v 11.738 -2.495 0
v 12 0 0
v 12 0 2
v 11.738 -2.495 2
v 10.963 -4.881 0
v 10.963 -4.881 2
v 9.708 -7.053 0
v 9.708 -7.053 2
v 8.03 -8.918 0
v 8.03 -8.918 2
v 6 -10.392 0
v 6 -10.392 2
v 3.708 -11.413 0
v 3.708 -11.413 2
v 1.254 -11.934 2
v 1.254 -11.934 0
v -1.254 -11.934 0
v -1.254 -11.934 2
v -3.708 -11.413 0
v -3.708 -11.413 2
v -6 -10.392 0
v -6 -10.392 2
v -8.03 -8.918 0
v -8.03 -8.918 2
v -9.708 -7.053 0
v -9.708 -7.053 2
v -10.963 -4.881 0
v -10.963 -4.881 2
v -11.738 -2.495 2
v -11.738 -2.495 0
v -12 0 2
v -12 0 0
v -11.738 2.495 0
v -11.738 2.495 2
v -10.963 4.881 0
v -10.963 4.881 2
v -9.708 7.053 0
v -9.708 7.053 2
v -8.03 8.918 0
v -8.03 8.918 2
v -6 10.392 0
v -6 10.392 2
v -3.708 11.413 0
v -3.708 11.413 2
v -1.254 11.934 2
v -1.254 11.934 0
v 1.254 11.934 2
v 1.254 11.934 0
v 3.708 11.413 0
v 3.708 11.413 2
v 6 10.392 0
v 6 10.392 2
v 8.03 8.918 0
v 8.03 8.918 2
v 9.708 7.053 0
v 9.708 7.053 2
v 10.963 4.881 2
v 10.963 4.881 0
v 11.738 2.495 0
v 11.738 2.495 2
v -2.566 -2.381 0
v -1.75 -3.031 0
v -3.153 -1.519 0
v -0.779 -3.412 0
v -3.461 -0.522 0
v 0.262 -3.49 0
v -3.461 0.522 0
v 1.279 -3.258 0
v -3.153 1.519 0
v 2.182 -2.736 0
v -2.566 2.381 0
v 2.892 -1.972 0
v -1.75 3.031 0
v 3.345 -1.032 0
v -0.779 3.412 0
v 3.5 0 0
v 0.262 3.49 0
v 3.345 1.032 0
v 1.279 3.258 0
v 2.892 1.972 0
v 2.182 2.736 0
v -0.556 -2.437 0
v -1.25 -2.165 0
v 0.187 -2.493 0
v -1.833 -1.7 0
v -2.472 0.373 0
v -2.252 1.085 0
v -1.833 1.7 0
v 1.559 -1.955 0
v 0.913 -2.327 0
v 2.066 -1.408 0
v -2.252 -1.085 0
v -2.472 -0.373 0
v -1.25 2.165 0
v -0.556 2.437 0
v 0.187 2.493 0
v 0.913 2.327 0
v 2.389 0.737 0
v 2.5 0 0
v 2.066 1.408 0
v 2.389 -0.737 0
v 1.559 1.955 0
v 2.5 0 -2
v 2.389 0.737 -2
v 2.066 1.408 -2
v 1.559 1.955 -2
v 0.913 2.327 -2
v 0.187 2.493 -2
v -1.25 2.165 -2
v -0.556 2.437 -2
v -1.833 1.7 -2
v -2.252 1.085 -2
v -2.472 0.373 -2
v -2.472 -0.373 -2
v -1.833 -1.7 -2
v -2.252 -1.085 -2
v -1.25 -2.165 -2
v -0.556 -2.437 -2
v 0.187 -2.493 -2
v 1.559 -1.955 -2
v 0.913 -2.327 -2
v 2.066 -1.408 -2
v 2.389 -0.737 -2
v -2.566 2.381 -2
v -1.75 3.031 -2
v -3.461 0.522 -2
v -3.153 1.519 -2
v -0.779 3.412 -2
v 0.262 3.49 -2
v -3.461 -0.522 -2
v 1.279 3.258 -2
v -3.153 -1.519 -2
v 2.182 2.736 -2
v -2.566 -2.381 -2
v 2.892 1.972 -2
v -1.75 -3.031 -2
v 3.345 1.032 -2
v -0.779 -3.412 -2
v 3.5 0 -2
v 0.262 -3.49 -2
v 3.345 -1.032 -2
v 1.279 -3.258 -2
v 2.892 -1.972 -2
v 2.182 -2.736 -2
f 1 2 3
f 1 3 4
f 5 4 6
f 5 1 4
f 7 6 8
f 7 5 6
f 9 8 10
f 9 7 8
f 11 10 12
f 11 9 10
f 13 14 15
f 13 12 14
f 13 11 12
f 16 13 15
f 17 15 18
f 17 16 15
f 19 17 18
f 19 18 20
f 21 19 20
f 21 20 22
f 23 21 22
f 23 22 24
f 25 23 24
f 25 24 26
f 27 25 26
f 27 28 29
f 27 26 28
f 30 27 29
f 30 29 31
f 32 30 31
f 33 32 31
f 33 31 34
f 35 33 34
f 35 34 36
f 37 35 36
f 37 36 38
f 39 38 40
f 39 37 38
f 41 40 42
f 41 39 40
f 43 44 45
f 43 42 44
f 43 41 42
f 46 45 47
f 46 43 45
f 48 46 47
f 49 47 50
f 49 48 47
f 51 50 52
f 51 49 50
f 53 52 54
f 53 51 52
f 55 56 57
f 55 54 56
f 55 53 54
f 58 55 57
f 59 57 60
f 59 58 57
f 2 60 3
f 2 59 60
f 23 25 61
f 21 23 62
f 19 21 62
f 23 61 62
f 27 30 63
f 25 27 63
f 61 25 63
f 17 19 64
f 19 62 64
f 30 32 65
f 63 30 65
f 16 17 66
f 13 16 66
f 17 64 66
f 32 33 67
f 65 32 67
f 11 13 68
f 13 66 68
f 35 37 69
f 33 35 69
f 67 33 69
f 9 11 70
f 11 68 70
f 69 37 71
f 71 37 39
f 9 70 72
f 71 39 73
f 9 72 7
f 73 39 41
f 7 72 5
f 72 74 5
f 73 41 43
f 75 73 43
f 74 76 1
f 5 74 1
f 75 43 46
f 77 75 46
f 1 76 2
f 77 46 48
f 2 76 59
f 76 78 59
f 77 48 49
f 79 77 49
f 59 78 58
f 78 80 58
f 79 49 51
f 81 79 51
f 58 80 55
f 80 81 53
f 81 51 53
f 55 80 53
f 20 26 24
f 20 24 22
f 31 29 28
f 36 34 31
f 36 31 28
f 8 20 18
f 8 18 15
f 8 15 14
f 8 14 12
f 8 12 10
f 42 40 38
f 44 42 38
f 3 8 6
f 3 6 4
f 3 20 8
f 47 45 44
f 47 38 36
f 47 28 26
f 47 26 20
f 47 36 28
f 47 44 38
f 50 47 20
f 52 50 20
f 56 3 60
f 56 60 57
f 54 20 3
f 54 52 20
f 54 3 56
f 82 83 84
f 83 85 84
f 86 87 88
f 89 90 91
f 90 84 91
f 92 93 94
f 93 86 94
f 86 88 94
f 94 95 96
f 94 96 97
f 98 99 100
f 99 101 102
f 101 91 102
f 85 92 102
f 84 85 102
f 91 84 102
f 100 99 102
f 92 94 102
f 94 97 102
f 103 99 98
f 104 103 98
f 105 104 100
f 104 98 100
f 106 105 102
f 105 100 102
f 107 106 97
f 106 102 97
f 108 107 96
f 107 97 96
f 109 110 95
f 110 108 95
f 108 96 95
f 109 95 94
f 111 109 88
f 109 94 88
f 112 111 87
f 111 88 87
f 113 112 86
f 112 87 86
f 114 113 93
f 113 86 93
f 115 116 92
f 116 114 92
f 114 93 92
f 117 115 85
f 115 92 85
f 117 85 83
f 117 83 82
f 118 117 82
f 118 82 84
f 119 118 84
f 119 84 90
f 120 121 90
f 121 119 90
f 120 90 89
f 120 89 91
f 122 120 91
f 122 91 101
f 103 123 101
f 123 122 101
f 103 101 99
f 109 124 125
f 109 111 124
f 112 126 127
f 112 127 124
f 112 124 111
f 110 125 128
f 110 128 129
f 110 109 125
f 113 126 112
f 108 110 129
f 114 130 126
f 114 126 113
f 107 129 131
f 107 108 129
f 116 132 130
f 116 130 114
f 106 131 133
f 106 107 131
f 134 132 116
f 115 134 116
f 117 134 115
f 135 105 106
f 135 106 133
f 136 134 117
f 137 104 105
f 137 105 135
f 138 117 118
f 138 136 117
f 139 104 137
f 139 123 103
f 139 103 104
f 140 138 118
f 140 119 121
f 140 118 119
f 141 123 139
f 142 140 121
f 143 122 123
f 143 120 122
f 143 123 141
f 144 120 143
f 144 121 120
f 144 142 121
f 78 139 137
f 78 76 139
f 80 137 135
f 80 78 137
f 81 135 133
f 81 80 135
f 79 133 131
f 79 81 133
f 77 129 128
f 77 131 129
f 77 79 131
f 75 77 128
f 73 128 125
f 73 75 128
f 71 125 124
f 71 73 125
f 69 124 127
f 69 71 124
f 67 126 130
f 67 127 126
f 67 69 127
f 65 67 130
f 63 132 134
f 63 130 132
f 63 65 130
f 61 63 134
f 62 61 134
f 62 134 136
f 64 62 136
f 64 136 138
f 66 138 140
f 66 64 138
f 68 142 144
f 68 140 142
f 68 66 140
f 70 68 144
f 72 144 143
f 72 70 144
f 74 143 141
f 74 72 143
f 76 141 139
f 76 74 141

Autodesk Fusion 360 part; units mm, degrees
sketch "Sketch1" plane through (0, 0, 0) normal (0, 0, 1) x (1, 0, 0)
  circle A0 centre (0, 0) radius 12
  dimension "d1" = 24
extrude "Extrude1" add sketch "Sketch1" along normal blind 2
sketch "Sketch2" plane through (0, 0, 0) normal (0, 0, -1) x (1, 0, 0)
  circle A0 centre (0, 0) radius 12
  circle A1 centre (0, 0) radius 2.5
  circle A2 centre (0, 0) radius 3.5
  dimension "d4" = 5
  dimension "d5" = 7
extrude "Extrude2" add sketch "Sketch2" along normal blind 2 contours A2
